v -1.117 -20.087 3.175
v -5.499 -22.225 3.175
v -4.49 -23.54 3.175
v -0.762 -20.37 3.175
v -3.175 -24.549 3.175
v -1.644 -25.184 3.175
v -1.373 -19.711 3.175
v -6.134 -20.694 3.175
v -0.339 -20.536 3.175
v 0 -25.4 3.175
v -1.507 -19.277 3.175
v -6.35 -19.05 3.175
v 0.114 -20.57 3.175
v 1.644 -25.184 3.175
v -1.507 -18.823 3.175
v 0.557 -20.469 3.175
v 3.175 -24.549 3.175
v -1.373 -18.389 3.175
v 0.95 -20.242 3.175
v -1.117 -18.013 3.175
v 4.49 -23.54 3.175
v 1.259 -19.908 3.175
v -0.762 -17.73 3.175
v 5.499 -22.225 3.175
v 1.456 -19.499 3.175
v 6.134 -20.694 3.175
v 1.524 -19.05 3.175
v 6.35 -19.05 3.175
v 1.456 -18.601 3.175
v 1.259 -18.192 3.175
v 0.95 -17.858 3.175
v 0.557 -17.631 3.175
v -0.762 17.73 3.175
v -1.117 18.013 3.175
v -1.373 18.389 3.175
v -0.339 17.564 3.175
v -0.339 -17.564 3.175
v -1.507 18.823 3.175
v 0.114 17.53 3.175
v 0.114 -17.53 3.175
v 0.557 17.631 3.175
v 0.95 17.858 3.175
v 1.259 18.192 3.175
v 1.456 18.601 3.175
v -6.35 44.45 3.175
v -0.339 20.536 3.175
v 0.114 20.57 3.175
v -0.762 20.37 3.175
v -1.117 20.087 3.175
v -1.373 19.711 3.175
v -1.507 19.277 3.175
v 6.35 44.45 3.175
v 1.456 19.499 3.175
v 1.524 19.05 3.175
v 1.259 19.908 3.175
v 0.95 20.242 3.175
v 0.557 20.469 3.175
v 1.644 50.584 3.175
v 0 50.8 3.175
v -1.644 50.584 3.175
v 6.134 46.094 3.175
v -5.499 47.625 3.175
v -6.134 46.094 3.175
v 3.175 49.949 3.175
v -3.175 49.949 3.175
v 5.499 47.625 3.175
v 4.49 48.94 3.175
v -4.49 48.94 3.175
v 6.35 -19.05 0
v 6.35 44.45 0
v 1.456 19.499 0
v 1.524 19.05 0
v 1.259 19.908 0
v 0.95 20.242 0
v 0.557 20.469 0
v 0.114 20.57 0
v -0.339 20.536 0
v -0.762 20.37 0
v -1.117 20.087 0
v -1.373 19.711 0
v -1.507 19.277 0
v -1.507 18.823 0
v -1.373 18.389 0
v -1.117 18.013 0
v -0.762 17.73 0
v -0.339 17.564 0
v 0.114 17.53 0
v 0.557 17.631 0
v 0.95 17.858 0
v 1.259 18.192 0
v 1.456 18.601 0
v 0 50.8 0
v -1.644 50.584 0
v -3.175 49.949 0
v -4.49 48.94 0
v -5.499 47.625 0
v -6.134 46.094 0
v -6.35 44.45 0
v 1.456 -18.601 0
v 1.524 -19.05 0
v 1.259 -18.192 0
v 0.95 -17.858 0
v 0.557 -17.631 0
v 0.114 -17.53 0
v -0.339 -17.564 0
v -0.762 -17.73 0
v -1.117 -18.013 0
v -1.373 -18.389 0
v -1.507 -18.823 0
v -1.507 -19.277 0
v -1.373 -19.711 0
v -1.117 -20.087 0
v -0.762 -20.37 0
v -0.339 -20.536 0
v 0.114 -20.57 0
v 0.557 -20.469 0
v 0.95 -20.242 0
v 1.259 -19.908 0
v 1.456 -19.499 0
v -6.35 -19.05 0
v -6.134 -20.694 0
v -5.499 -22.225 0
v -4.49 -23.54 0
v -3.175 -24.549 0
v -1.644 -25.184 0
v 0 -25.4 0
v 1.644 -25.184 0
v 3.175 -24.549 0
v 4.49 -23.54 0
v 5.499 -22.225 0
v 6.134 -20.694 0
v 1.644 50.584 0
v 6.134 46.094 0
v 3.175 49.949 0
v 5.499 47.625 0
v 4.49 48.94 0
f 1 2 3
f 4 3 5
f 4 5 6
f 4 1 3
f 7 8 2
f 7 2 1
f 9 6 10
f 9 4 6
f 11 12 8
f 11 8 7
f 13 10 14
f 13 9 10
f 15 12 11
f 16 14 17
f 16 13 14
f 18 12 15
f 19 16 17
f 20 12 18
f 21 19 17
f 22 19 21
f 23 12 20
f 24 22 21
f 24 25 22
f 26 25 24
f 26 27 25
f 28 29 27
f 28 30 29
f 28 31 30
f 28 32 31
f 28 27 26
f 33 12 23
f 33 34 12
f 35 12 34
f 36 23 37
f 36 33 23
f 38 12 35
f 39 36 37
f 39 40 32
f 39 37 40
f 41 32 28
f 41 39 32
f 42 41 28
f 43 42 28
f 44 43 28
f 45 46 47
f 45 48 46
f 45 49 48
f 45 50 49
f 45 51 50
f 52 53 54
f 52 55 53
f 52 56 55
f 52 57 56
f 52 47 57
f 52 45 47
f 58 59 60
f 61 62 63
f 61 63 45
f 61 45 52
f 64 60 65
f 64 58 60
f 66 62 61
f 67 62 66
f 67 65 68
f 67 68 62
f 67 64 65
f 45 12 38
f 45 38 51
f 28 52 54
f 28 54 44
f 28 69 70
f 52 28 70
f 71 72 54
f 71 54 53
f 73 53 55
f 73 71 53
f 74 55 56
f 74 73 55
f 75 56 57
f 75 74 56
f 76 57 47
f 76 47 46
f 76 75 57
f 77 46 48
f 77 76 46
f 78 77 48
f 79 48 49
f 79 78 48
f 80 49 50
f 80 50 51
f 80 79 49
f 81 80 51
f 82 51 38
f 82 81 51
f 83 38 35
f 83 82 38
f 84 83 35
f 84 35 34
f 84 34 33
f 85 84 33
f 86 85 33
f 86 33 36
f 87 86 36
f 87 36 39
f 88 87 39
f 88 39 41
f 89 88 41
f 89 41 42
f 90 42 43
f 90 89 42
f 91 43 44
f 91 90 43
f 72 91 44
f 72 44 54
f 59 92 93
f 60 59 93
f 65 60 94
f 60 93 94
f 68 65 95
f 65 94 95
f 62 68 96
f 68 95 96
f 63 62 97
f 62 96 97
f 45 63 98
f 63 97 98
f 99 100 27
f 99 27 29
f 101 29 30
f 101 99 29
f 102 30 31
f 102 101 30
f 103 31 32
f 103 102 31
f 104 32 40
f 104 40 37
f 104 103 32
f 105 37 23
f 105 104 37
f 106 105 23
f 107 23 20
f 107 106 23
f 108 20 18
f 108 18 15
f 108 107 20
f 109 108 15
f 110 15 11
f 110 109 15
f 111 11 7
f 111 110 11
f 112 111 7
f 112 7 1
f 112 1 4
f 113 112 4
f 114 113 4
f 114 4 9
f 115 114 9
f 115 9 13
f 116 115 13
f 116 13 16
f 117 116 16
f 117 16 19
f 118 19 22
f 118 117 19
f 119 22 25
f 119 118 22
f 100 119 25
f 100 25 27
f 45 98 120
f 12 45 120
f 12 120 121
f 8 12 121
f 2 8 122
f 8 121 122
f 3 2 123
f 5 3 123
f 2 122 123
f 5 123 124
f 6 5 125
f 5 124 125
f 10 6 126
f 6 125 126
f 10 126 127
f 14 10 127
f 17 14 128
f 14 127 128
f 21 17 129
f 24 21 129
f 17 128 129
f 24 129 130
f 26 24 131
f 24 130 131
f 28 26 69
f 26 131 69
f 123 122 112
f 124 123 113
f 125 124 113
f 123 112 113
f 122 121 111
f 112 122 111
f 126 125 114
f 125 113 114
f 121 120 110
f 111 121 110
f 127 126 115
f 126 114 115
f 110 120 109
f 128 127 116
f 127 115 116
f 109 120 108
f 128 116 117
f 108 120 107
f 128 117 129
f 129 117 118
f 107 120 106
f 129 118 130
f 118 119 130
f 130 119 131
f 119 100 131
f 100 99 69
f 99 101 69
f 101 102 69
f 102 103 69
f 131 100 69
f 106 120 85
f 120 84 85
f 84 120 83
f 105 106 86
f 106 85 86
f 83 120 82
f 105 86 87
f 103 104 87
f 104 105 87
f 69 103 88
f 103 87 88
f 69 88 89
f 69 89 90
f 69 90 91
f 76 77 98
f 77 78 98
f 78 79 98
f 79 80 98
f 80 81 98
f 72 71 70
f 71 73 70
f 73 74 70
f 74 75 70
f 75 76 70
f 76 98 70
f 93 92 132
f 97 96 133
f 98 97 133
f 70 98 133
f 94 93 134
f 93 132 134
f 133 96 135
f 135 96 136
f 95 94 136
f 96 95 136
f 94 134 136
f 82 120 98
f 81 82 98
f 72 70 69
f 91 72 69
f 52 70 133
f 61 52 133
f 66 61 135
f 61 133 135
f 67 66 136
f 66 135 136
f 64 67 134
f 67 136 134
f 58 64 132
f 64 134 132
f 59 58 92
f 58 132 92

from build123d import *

# Parameters (mm, degrees)
F0_R     = 1.524
F1_DEPTH = 3.175


with BuildPart() as f1:
    # F0 (on Top) → F1 (new body)
    with BuildSketch(Plane.XY):
        with BuildLine():
            Line((-6.35, 25.4), (6.35, 25.4))
            Line((6.35, 25.4), (6.35, 44.45))
            ThreePointArc((6.35, 44.45), (4.490128, 48.940128), (0, 50.8))
            ThreePointArc((0, 50.8), (-4.490128, 48.940128), (-6.35, 44.45))
            Line((-6.35, 44.45), (-6.35, 25.4))
        make_face()
        with BuildLine():
            Line((6.35, -19.05), (6.35, 25.4))
            Line((6.35, 25.4), (-6.35, 25.4))
            Line((-6.35, 25.4), (-6.35, -19.05))
            ThreePointArc((-6.35, -19.05), (-4.490128, -23.540128), (0, -25.4))
            ThreePointArc((0, -25.4), (4.490128, -23.540128), (6.35, -19.05))
        make_face()
        with Locations((0, -19.05)):
            Circle(F0_R, mode=Mode.SUBTRACT)
        with Locations((0, 19.05)):
            Circle(F0_R, mode=Mode.SUBTRACT)
    extrude(amount=F1_DEPTH)


solid = f1.part
